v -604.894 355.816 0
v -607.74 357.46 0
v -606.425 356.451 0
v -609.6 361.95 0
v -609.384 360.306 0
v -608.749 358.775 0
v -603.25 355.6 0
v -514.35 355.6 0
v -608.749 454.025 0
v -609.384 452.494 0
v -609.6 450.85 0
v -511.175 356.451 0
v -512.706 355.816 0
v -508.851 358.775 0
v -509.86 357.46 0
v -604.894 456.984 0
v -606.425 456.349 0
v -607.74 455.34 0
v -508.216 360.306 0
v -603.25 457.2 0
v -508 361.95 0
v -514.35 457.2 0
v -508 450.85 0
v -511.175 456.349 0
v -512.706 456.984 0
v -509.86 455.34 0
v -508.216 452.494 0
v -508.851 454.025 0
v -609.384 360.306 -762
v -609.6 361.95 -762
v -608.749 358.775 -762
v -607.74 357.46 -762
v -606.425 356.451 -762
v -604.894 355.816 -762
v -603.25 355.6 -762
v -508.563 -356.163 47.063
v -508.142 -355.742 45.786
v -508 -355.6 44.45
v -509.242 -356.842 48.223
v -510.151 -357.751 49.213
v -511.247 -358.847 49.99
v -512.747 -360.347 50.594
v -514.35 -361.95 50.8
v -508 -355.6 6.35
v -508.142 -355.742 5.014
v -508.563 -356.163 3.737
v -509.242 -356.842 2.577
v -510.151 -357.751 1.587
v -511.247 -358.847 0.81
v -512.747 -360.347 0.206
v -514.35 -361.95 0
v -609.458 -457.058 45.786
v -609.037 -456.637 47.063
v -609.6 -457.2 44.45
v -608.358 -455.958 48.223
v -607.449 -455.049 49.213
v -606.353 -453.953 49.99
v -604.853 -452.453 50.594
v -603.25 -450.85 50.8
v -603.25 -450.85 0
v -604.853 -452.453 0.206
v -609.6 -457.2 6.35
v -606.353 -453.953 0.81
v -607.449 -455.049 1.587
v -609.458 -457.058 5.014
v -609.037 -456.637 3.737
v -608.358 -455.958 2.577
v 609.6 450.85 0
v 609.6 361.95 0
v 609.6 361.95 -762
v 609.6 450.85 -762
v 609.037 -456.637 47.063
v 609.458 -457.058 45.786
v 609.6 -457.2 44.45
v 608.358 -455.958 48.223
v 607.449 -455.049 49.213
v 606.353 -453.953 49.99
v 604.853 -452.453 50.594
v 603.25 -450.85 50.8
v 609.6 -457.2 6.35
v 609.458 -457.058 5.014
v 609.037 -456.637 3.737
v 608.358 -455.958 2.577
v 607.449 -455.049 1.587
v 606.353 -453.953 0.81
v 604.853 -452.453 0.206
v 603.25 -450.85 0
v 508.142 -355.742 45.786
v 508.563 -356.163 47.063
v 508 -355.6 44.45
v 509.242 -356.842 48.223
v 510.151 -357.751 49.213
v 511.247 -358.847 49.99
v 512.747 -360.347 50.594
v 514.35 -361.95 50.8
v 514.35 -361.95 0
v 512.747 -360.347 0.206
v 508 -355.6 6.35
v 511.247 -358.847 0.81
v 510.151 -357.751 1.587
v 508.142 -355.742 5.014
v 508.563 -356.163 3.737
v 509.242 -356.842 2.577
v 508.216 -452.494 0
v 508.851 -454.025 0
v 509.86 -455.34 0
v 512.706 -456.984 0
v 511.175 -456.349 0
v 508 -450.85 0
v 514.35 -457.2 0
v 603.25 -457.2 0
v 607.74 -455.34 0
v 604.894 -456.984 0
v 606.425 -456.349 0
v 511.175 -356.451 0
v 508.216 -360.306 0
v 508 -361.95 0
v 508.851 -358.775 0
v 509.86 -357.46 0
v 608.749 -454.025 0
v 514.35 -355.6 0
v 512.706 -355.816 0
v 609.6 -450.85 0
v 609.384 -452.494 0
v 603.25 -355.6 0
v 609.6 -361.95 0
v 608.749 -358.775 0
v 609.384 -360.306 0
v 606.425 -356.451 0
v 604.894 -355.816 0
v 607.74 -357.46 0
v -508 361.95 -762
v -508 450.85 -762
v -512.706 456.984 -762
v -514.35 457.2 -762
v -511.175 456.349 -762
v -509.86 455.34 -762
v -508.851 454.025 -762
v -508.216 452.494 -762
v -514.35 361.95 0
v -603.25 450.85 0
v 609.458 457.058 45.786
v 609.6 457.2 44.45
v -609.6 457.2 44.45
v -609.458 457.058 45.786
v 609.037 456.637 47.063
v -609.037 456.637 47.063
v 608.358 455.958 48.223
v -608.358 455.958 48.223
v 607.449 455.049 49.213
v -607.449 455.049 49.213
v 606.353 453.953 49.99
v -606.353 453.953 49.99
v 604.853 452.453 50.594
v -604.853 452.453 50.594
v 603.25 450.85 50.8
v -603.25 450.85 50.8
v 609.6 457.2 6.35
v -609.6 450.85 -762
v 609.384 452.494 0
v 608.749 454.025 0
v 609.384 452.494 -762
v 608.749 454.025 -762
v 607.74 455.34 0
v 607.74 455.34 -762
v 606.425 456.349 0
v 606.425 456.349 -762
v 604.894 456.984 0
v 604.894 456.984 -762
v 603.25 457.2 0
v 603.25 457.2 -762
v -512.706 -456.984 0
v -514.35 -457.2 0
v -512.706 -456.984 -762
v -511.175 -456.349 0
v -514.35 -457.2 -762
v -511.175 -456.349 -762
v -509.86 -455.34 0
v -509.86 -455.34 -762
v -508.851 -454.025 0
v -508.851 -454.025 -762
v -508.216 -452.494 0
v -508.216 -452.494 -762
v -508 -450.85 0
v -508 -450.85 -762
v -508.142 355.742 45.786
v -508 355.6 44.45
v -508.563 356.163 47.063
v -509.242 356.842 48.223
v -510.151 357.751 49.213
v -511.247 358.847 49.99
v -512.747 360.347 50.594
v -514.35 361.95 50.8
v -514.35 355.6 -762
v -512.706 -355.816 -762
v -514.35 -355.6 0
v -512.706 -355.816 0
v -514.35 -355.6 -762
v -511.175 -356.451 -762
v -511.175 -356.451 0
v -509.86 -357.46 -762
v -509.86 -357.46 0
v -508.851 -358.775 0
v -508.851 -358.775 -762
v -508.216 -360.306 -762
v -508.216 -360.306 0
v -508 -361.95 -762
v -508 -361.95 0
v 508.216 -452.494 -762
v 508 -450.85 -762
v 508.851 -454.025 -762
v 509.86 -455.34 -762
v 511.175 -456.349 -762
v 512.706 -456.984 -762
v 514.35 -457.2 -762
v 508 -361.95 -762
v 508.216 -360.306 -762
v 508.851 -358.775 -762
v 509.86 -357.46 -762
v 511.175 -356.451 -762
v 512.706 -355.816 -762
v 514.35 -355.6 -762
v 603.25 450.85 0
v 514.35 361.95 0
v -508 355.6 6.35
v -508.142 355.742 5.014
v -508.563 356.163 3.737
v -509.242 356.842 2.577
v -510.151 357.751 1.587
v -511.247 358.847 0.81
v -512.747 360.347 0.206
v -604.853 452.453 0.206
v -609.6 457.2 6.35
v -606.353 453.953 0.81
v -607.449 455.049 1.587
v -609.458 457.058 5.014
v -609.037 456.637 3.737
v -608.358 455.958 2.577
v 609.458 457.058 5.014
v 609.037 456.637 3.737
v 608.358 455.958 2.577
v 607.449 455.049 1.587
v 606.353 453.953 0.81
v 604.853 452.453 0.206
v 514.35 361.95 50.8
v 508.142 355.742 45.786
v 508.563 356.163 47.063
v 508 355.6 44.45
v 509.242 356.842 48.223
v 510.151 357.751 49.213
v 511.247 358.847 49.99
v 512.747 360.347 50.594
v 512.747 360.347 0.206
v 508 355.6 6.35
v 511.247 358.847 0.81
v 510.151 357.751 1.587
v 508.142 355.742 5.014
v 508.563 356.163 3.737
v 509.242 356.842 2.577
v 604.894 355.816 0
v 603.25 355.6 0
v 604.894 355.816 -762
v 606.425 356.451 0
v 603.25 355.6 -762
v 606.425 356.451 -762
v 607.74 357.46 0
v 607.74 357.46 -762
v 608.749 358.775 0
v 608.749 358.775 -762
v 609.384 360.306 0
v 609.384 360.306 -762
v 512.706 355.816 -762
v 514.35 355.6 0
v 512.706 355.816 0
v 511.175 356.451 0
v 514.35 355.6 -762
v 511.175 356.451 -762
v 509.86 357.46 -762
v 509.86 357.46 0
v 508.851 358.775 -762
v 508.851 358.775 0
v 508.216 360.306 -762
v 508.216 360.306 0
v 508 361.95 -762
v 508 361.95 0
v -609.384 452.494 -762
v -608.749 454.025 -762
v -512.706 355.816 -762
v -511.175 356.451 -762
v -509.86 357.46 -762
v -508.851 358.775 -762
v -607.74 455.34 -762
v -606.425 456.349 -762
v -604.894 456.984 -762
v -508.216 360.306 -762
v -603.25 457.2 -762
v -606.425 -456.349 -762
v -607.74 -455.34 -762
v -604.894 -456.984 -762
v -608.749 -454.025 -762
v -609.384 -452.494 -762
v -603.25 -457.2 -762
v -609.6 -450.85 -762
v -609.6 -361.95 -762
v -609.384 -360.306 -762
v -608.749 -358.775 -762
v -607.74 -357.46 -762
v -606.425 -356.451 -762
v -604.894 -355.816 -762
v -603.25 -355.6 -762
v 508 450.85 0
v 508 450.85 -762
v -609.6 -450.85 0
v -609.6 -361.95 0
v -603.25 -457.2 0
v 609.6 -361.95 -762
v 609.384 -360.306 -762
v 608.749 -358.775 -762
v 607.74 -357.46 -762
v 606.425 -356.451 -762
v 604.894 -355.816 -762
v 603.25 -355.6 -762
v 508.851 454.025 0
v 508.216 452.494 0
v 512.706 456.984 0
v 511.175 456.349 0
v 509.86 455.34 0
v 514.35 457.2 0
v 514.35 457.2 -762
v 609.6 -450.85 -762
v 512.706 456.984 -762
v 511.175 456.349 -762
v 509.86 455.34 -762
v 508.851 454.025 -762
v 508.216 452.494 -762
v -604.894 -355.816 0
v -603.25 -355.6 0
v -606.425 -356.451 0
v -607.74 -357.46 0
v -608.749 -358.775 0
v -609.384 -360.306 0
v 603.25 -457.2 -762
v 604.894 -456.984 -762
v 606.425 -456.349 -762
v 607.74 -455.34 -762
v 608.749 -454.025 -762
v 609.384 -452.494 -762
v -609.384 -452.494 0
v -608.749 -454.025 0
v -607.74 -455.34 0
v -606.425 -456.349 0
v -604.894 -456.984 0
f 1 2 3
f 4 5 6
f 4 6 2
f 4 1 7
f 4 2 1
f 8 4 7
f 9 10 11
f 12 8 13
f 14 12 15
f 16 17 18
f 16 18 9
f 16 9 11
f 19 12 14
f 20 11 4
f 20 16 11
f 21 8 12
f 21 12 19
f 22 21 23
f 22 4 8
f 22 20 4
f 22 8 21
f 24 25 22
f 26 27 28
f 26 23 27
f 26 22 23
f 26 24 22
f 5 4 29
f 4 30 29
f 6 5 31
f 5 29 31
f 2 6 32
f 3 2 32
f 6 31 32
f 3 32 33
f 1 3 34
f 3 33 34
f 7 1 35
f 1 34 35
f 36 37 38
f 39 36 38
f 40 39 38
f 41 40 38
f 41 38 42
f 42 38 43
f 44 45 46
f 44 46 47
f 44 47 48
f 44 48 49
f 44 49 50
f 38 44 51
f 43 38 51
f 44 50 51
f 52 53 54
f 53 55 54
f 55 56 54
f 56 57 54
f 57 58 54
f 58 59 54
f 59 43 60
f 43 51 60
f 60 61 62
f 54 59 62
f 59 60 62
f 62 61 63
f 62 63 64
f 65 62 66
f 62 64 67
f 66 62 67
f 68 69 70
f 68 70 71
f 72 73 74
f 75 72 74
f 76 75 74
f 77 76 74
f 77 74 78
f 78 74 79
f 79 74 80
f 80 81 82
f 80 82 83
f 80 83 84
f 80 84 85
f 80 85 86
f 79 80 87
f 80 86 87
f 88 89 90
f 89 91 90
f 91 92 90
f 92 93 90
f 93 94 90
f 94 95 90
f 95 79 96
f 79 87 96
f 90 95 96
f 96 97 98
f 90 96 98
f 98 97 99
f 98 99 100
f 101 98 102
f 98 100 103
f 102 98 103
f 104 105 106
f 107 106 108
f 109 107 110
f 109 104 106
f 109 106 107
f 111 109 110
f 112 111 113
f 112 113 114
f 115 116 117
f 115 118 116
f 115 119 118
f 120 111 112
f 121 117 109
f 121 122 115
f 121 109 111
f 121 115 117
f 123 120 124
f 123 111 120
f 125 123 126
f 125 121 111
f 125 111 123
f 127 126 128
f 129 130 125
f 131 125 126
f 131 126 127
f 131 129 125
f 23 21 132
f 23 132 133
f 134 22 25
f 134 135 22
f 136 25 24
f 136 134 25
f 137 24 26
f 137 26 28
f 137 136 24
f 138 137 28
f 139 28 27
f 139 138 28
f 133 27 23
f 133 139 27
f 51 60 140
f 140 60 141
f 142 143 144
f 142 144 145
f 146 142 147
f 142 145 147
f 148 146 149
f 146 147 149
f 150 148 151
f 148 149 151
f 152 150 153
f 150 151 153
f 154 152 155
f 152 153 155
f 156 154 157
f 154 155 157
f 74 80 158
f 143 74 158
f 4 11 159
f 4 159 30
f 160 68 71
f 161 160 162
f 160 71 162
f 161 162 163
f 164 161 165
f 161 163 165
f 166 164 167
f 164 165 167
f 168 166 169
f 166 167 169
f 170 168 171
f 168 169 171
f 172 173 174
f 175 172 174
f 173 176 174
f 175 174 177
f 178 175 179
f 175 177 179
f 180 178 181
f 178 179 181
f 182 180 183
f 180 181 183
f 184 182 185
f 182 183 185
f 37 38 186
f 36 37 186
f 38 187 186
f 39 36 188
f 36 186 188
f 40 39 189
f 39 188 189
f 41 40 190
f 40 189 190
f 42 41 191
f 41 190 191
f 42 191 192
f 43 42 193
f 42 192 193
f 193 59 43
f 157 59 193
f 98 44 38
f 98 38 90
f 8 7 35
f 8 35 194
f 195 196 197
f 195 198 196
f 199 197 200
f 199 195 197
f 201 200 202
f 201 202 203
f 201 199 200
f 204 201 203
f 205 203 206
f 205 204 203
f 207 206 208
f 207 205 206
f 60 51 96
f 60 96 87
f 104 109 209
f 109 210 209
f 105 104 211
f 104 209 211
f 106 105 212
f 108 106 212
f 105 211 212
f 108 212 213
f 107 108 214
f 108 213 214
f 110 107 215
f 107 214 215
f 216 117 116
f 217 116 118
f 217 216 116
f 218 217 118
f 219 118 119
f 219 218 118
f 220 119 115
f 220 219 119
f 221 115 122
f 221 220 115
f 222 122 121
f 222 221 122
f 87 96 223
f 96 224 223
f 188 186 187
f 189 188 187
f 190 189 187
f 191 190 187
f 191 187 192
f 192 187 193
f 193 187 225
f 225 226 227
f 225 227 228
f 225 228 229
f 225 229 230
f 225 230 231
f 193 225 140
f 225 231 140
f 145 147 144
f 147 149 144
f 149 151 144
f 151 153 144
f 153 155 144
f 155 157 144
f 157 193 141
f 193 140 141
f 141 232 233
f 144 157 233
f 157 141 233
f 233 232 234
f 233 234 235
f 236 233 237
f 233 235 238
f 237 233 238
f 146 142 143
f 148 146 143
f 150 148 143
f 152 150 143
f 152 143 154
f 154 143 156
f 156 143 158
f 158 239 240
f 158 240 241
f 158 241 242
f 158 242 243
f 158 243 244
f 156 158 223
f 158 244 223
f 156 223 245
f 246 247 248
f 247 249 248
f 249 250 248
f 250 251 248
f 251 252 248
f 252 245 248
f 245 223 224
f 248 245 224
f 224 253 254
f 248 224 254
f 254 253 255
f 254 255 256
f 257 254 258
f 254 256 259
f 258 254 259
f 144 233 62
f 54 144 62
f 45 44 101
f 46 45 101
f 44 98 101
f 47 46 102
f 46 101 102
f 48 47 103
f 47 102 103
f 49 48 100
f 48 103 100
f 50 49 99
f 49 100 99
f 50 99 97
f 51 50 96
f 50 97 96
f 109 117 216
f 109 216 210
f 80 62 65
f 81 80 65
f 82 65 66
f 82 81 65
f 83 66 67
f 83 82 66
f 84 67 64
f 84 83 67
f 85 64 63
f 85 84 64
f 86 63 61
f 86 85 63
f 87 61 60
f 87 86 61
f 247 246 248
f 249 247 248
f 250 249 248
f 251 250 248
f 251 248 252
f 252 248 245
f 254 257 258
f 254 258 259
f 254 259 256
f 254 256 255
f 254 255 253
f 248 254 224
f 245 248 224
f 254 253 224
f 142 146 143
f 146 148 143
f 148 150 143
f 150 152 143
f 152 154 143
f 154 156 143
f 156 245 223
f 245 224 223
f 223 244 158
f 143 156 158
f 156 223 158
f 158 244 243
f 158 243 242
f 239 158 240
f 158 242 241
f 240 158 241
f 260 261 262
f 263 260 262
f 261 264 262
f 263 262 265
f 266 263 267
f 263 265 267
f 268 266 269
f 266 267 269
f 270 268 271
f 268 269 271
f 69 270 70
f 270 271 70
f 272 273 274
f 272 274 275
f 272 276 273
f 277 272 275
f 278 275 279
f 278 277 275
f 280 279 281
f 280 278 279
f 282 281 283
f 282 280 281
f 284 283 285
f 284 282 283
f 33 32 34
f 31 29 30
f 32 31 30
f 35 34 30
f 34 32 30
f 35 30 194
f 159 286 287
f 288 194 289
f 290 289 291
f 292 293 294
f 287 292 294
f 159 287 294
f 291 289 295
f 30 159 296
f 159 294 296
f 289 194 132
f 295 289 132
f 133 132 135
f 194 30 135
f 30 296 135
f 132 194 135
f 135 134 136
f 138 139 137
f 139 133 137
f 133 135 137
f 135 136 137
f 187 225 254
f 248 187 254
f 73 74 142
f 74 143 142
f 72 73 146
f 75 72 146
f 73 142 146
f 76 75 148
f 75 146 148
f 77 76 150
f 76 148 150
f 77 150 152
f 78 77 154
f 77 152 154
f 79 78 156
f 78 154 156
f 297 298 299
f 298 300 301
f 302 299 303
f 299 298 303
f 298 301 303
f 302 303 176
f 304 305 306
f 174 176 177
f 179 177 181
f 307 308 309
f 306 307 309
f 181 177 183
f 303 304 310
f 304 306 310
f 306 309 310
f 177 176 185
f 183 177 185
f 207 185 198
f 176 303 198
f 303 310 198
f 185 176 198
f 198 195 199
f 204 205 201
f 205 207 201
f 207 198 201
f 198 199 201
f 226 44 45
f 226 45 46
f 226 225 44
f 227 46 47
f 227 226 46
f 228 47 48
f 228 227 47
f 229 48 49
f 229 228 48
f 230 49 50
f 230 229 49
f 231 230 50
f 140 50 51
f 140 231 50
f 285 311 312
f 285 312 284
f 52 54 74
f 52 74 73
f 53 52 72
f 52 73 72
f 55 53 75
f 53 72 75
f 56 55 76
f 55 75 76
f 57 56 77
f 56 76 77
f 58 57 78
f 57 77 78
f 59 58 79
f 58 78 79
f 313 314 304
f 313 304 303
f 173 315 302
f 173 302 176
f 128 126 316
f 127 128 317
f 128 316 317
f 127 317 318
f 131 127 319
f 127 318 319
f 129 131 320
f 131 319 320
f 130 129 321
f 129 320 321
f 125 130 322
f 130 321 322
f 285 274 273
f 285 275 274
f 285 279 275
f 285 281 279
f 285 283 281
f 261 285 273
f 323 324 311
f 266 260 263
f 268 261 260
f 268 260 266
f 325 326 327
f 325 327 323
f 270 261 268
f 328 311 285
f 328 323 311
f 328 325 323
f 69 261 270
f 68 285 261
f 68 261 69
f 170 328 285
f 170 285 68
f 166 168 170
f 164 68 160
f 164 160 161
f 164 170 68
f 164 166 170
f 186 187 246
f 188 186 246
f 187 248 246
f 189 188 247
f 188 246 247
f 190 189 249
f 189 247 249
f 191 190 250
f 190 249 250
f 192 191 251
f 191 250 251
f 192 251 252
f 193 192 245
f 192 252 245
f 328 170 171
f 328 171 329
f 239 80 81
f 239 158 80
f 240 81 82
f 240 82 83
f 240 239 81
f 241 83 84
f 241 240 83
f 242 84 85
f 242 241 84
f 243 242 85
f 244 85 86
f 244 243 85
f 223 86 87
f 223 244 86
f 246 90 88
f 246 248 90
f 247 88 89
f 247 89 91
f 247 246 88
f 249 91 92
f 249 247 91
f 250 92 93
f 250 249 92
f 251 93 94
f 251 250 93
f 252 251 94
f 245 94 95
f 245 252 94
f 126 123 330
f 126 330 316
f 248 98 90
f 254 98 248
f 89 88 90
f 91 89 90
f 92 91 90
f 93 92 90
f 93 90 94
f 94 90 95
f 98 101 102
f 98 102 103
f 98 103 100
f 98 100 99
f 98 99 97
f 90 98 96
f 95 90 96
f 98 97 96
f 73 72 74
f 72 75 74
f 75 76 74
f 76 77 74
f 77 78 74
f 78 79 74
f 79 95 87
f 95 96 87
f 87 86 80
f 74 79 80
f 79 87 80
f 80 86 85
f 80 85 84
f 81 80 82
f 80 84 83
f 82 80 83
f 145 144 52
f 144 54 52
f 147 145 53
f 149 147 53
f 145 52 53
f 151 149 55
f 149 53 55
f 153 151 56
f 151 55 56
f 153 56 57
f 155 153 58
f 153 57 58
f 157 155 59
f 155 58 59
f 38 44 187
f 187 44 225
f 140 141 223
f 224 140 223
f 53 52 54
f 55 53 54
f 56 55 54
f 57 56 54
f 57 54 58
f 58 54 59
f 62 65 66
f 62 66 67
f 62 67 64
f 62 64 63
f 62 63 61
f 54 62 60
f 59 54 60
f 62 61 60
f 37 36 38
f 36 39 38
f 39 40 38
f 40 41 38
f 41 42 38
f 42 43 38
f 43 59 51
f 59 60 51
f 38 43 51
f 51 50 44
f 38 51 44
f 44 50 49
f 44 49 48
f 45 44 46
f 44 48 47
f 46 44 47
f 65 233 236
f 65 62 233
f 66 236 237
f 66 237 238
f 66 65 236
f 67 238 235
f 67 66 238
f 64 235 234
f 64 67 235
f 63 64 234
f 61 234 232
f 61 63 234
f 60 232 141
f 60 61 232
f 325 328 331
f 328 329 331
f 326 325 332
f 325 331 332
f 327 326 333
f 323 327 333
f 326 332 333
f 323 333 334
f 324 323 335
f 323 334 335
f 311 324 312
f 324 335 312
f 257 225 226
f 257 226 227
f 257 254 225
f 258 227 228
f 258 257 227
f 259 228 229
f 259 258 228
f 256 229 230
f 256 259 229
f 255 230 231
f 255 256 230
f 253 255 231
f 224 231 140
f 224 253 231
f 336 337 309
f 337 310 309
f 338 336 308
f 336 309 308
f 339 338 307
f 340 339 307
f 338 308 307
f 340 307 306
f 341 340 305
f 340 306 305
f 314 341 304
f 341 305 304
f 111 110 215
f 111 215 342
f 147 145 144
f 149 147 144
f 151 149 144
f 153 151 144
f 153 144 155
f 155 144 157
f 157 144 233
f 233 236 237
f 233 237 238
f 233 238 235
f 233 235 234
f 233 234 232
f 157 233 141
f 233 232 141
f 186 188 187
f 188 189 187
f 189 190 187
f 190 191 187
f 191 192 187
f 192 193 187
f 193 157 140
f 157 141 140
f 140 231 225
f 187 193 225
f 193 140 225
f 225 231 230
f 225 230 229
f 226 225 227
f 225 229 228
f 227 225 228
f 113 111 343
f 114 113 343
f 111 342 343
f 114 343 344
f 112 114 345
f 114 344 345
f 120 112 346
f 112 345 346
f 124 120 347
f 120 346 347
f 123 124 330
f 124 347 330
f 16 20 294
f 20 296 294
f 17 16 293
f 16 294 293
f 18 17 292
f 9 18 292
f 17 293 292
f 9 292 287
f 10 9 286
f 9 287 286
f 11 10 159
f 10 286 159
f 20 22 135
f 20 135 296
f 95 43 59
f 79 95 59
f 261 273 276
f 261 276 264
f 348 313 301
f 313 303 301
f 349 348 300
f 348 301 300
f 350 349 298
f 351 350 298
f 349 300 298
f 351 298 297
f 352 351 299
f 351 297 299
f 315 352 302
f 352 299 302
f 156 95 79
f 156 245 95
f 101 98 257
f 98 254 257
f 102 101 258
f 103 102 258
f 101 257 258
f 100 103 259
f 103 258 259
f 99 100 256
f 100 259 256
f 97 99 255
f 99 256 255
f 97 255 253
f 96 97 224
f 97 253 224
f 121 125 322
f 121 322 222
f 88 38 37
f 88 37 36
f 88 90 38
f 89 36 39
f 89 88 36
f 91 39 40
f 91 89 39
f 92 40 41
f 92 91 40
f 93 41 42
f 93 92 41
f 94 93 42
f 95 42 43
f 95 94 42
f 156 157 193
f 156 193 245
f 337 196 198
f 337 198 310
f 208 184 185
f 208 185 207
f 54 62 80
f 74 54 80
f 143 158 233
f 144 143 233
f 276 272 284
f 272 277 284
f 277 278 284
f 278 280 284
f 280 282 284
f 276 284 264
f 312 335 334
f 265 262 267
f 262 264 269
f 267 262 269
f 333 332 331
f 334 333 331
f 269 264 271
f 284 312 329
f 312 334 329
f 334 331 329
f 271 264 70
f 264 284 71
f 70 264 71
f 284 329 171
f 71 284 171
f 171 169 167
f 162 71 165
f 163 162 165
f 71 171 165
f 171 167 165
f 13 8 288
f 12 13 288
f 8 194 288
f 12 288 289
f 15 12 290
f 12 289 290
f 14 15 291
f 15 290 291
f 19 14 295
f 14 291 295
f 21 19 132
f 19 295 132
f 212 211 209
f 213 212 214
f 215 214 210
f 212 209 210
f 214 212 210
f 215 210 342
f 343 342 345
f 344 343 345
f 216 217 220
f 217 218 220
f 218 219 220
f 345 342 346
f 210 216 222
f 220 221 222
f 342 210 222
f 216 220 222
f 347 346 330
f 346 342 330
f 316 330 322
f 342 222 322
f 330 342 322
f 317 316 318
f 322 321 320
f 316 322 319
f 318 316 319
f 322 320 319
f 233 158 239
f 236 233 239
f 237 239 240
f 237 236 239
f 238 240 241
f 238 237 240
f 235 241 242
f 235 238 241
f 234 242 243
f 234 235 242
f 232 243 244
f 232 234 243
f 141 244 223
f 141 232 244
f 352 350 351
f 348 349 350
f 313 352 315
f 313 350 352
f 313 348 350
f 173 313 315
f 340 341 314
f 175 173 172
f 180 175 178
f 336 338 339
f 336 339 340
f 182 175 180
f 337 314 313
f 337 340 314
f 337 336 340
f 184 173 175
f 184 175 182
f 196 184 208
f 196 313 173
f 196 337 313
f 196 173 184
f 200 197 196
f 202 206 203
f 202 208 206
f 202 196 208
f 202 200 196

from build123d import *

# Parameters (mm, degrees)
F0_W     = 101.6
F0_H     = 711.2
F1_DEPTH = 50.8
F0_W_2   = 1016
F0_H_2   = 101.6
F2_DEPTH = 50.8
F3_DEPTH = 50.8
F4_DEPTH = 50.8
F5_R     = 6.35
F5_2_R   = 6.35
F5_3_R   = 6.35
F5_4_R   = 6.35
F6_DEPTH = 762
F7_DEPTH = 762
F8_DEPTH = 762
F9_DEPTH = 762
F10_R    = 6.35
F10_2_R  = 6.35
F10_3_R  = 6.35
F10_4_R  = 6.35


with BuildPart() as f1:
    # F0 (on Top) → F1 (new body)
    with BuildSketch(Plane.XY):
        with Locations((-558.8, 0)):
            Rectangle(F0_W, F0_H)
        Polygon((-508, 355.6), (-609.6, 457.2), (-609.6, 355.6), align=None)
        Polygon((-508, -355.6), (-609.6, -355.6), (-609.6, -457.2), align=None)
    extrude(amount=F1_DEPTH)

    # F5#3
    f5_3_edges = [f1.edges().sort_by_distance(p)[0] for p in [
        (-508, 0, 0),
        (-508, 0, 50.8),
        (-609.6, 0, 50.8),
        (-609.6, 0, 0),
    ]]
    fillet(f5_3_edges, radius=F5_3_R)


with BuildPart() as f2:
    # F0 (on Top) → F2 (new body)
    with BuildSketch(Plane.XY):
        with Locations((0, 406.4)):
            Rectangle(F0_W_2, F0_H_2)
        Polygon((-508, 457.2), (-609.6, 457.2), (-508, 355.6), align=None)
        Polygon((609.6, 457.2), (508, 457.2), (508, 355.6), align=None)
    extrude(amount=F2_DEPTH)

    # F5#4
    f5_4_edges = [f2.edges().sort_by_distance(p)[0] for p in [
        (0, 355.6, 50.8),
        (0, 457.2, 50.8),
        (0, 457.2, 0),
        (0, 355.6, 0),
    ]]
    fillet(f5_4_edges, radius=F5_4_R)


with BuildPart() as f3:
    # F0 (on Top) → F3 (new body)
    with BuildSketch(Plane.XY):
        with Locations((558.8, 0)):
            Rectangle(F0_W, F0_H)
        Polygon((609.6, -355.6), (508, -355.6), (609.6, -457.2), align=None)
        Polygon((609.6, 457.2), (508, 355.6), (609.6, 355.6), align=None)
    extrude(amount=F3_DEPTH)

    # F5#2
    f5_2_edges = [f3.edges().sort_by_distance(p)[0] for p in [
        (609.6, 0, 0),
        (609.6, 0, 50.8),
        (508, 0, 50.8),
        (508, 0, 0),
    ]]
    fillet(f5_2_edges, radius=F5_2_R)


with BuildPart() as f4:
    # F0 (on Top) → F4 (new body)
    with BuildSketch(Plane.XY):
        with Locations((0, -406.4)):
            Rectangle(F0_W_2, F0_H_2)
        Polygon((609.6, -457.2), (508, -355.6), (508, -457.2), align=None)
        Polygon((-508, -457.2), (-508, -355.6), (-609.6, -457.2), align=None)
    extrude(amount=F4_DEPTH)

    # F5
    f5_edges = [f4.edges().sort_by_distance(p)[0] for p in [
        (0, -457.2, 50.8),
        (0, -457.2, 0),
        (0, -355.6, 50.8),
        (0, -355.6, 0),
    ]]
    fillet(f5_edges, radius=F5_R)


with BuildPart() as f6:
    # F0 (on Top) → F6 (new body)
    with BuildSketch(Plane.XY):
        Polygon((-508, 457.2), (-609.6, 457.2), (-508, 355.6), align=None)
        Polygon((-508, 355.6), (-609.6, 457.2), (-609.6, 355.6), align=None)
    extrude(amount=-F6_DEPTH)

    # F10#3
    f10_3_edges = [f6.edges().sort_by_distance(p)[0] for p in [
        (-609.6, 355.6, -381),
        (-508, 355.6, -381),
        (-508, 457.2, -381),
        (-609.6, 457.2, -381),
    ]]
    fillet(f10_3_edges, radius=F10_3_R)


with BuildPart() as f7:
    # F0 (on Top) → F7 (new body)
    with BuildSketch(Plane.XY):
        Polygon((-508, -355.6), (-609.6, -355.6), (-609.6, -457.2), align=None)
        Polygon((-508, -457.2), (-508, -355.6), (-609.6, -457.2), align=None)
    extrude(amount=-F7_DEPTH)

    # F10#2
    f10_2_edges = [f7.edges().sort_by_distance(p)[0] for p in [
        (-508, -355.6, -381),
        (-508, -457.2, -381),
        (-609.6, -457.2, -381),
        (-609.6, -355.6, -381),
    ]]
    fillet(f10_2_edges, radius=F10_2_R)


with BuildPart() as f8:
    # F0 (on Top) → F8 (new body)
    with BuildSketch(Plane.XY):
        Polygon((609.6, 457.2), (508, 355.6), (609.6, 355.6), align=None)
        Polygon((609.6, 457.2), (508, 457.2), (508, 355.6), align=None)
    extrude(amount=-F8_DEPTH)

    # F10#4
    f10_4_edges = [f8.edges().sort_by_distance(p)[0] for p in [
        (508, 355.6, -381),
        (609.6, 355.6, -381),
        (609.6, 457.2, -381),
        (508, 457.2, -381),
    ]]
    fillet(f10_4_edges, radius=F10_4_R)


with BuildPart() as f9:
    # F0 (on Top) → F9 (new body)
    with BuildSketch(Plane.XY):
        Polygon((609.6, -457.2), (508, -355.6), (508, -457.2), align=None)
        Polygon((609.6, -355.6), (508, -355.6), (609.6, -457.2), align=None)
    extrude(amount=-F9_DEPTH)

    # F10
    f10_edges = [f9.edges().sort_by_distance(p)[0] for p in [
        (609.6, -457.2, -381),
        (508, -457.2, -381),
        (609.6, -355.6, -381),
        (508, -355.6, -381),
    ]]
    fillet(f10_edges, radius=F10_R)


solid = Compound([f1.part, f2.part, f3.part, f4.part, f6.part, f7.part, f8.part, f9.part])
